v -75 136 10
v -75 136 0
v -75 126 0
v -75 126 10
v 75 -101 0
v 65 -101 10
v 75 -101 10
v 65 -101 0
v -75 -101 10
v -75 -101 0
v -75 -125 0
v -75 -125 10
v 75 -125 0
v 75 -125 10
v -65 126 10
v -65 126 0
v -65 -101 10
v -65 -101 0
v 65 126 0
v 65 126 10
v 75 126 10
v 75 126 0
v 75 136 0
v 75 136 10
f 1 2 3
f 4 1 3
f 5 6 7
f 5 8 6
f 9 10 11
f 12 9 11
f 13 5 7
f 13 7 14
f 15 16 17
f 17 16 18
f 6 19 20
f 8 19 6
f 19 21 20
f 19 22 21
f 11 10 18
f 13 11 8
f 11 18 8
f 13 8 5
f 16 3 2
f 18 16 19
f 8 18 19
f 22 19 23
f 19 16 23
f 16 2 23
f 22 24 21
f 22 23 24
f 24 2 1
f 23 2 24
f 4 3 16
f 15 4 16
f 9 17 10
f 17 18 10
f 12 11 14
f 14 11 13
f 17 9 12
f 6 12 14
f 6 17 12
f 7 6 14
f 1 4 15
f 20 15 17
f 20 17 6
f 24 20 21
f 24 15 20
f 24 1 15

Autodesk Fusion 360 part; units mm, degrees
sketch "Esquisse1" plane through (0, 0, 0) normal (0, 0, 1) x (1, 0, 0)
  line L0 (75, -125) -> (-75, -125) construction
  line L1 (-75, -125) -> (-75, 125) construction
  line L2 (-75, 125) -> (75, 125) construction
  line L3 (75, 125) -> (75, -125) construction
  line L4 (75, -125) -> (-75, 125) construction
  line L5 (-75, -125) -> (75, 125) construction
  line L6 (-75, 125) -> (75, 125) construction
  line L7 (75, 125) -> (75, 136) construction
  line L8 (75, 136) -> (-75, 136) construction
  line L9 (-75, 136) -> (-75, 125) construction
  line L10 (-75, 136) -> (-75, 126)
  line L11 (-75, 126) -> (-65, 126)
  line L12 (-65, 126) -> (-65, -101)
  line L13 (-65, -101) -> (-75, -101)
  line L14 (-75, -101) -> (-75, -125)
  line L15 (-75, -125) -> (0, -125)
  line L16 (0, -125) -> (0, -120)
  line L17 (0, -120) -> (0, 136)
  line L18 (-75, 136) -> (0, 136)
  line L19 (75, 136) -> (0, 136)
  line L20 (75, 136) -> (75, 125) construction
  line L21 (0, -120) -> (0, 136)
  line L22 (0, -125) -> (0, -120)
  line L23 (75, -101) -> (75, -125)
  line L24 (75, -125) -> (0, -125)
  line L25 (65, -101) -> (75, -101)
  line L26 (75, -125) -> (75, 125) construction
  line L27 (75, 126) -> (65, 126)
  line L28 (75, 136) -> (75, 126)
  line L29 (65, 126) -> (65, -101)
  dimension "d1" = 150
  dimension "d2" = 250
  dimension "d3" = 11
  dimension "d4" = 10
  dimension "d5" = 10
  dimension "d6" = 24
extrude "Extrusion1" add sketch "Esquisse1" along normal blind 10
